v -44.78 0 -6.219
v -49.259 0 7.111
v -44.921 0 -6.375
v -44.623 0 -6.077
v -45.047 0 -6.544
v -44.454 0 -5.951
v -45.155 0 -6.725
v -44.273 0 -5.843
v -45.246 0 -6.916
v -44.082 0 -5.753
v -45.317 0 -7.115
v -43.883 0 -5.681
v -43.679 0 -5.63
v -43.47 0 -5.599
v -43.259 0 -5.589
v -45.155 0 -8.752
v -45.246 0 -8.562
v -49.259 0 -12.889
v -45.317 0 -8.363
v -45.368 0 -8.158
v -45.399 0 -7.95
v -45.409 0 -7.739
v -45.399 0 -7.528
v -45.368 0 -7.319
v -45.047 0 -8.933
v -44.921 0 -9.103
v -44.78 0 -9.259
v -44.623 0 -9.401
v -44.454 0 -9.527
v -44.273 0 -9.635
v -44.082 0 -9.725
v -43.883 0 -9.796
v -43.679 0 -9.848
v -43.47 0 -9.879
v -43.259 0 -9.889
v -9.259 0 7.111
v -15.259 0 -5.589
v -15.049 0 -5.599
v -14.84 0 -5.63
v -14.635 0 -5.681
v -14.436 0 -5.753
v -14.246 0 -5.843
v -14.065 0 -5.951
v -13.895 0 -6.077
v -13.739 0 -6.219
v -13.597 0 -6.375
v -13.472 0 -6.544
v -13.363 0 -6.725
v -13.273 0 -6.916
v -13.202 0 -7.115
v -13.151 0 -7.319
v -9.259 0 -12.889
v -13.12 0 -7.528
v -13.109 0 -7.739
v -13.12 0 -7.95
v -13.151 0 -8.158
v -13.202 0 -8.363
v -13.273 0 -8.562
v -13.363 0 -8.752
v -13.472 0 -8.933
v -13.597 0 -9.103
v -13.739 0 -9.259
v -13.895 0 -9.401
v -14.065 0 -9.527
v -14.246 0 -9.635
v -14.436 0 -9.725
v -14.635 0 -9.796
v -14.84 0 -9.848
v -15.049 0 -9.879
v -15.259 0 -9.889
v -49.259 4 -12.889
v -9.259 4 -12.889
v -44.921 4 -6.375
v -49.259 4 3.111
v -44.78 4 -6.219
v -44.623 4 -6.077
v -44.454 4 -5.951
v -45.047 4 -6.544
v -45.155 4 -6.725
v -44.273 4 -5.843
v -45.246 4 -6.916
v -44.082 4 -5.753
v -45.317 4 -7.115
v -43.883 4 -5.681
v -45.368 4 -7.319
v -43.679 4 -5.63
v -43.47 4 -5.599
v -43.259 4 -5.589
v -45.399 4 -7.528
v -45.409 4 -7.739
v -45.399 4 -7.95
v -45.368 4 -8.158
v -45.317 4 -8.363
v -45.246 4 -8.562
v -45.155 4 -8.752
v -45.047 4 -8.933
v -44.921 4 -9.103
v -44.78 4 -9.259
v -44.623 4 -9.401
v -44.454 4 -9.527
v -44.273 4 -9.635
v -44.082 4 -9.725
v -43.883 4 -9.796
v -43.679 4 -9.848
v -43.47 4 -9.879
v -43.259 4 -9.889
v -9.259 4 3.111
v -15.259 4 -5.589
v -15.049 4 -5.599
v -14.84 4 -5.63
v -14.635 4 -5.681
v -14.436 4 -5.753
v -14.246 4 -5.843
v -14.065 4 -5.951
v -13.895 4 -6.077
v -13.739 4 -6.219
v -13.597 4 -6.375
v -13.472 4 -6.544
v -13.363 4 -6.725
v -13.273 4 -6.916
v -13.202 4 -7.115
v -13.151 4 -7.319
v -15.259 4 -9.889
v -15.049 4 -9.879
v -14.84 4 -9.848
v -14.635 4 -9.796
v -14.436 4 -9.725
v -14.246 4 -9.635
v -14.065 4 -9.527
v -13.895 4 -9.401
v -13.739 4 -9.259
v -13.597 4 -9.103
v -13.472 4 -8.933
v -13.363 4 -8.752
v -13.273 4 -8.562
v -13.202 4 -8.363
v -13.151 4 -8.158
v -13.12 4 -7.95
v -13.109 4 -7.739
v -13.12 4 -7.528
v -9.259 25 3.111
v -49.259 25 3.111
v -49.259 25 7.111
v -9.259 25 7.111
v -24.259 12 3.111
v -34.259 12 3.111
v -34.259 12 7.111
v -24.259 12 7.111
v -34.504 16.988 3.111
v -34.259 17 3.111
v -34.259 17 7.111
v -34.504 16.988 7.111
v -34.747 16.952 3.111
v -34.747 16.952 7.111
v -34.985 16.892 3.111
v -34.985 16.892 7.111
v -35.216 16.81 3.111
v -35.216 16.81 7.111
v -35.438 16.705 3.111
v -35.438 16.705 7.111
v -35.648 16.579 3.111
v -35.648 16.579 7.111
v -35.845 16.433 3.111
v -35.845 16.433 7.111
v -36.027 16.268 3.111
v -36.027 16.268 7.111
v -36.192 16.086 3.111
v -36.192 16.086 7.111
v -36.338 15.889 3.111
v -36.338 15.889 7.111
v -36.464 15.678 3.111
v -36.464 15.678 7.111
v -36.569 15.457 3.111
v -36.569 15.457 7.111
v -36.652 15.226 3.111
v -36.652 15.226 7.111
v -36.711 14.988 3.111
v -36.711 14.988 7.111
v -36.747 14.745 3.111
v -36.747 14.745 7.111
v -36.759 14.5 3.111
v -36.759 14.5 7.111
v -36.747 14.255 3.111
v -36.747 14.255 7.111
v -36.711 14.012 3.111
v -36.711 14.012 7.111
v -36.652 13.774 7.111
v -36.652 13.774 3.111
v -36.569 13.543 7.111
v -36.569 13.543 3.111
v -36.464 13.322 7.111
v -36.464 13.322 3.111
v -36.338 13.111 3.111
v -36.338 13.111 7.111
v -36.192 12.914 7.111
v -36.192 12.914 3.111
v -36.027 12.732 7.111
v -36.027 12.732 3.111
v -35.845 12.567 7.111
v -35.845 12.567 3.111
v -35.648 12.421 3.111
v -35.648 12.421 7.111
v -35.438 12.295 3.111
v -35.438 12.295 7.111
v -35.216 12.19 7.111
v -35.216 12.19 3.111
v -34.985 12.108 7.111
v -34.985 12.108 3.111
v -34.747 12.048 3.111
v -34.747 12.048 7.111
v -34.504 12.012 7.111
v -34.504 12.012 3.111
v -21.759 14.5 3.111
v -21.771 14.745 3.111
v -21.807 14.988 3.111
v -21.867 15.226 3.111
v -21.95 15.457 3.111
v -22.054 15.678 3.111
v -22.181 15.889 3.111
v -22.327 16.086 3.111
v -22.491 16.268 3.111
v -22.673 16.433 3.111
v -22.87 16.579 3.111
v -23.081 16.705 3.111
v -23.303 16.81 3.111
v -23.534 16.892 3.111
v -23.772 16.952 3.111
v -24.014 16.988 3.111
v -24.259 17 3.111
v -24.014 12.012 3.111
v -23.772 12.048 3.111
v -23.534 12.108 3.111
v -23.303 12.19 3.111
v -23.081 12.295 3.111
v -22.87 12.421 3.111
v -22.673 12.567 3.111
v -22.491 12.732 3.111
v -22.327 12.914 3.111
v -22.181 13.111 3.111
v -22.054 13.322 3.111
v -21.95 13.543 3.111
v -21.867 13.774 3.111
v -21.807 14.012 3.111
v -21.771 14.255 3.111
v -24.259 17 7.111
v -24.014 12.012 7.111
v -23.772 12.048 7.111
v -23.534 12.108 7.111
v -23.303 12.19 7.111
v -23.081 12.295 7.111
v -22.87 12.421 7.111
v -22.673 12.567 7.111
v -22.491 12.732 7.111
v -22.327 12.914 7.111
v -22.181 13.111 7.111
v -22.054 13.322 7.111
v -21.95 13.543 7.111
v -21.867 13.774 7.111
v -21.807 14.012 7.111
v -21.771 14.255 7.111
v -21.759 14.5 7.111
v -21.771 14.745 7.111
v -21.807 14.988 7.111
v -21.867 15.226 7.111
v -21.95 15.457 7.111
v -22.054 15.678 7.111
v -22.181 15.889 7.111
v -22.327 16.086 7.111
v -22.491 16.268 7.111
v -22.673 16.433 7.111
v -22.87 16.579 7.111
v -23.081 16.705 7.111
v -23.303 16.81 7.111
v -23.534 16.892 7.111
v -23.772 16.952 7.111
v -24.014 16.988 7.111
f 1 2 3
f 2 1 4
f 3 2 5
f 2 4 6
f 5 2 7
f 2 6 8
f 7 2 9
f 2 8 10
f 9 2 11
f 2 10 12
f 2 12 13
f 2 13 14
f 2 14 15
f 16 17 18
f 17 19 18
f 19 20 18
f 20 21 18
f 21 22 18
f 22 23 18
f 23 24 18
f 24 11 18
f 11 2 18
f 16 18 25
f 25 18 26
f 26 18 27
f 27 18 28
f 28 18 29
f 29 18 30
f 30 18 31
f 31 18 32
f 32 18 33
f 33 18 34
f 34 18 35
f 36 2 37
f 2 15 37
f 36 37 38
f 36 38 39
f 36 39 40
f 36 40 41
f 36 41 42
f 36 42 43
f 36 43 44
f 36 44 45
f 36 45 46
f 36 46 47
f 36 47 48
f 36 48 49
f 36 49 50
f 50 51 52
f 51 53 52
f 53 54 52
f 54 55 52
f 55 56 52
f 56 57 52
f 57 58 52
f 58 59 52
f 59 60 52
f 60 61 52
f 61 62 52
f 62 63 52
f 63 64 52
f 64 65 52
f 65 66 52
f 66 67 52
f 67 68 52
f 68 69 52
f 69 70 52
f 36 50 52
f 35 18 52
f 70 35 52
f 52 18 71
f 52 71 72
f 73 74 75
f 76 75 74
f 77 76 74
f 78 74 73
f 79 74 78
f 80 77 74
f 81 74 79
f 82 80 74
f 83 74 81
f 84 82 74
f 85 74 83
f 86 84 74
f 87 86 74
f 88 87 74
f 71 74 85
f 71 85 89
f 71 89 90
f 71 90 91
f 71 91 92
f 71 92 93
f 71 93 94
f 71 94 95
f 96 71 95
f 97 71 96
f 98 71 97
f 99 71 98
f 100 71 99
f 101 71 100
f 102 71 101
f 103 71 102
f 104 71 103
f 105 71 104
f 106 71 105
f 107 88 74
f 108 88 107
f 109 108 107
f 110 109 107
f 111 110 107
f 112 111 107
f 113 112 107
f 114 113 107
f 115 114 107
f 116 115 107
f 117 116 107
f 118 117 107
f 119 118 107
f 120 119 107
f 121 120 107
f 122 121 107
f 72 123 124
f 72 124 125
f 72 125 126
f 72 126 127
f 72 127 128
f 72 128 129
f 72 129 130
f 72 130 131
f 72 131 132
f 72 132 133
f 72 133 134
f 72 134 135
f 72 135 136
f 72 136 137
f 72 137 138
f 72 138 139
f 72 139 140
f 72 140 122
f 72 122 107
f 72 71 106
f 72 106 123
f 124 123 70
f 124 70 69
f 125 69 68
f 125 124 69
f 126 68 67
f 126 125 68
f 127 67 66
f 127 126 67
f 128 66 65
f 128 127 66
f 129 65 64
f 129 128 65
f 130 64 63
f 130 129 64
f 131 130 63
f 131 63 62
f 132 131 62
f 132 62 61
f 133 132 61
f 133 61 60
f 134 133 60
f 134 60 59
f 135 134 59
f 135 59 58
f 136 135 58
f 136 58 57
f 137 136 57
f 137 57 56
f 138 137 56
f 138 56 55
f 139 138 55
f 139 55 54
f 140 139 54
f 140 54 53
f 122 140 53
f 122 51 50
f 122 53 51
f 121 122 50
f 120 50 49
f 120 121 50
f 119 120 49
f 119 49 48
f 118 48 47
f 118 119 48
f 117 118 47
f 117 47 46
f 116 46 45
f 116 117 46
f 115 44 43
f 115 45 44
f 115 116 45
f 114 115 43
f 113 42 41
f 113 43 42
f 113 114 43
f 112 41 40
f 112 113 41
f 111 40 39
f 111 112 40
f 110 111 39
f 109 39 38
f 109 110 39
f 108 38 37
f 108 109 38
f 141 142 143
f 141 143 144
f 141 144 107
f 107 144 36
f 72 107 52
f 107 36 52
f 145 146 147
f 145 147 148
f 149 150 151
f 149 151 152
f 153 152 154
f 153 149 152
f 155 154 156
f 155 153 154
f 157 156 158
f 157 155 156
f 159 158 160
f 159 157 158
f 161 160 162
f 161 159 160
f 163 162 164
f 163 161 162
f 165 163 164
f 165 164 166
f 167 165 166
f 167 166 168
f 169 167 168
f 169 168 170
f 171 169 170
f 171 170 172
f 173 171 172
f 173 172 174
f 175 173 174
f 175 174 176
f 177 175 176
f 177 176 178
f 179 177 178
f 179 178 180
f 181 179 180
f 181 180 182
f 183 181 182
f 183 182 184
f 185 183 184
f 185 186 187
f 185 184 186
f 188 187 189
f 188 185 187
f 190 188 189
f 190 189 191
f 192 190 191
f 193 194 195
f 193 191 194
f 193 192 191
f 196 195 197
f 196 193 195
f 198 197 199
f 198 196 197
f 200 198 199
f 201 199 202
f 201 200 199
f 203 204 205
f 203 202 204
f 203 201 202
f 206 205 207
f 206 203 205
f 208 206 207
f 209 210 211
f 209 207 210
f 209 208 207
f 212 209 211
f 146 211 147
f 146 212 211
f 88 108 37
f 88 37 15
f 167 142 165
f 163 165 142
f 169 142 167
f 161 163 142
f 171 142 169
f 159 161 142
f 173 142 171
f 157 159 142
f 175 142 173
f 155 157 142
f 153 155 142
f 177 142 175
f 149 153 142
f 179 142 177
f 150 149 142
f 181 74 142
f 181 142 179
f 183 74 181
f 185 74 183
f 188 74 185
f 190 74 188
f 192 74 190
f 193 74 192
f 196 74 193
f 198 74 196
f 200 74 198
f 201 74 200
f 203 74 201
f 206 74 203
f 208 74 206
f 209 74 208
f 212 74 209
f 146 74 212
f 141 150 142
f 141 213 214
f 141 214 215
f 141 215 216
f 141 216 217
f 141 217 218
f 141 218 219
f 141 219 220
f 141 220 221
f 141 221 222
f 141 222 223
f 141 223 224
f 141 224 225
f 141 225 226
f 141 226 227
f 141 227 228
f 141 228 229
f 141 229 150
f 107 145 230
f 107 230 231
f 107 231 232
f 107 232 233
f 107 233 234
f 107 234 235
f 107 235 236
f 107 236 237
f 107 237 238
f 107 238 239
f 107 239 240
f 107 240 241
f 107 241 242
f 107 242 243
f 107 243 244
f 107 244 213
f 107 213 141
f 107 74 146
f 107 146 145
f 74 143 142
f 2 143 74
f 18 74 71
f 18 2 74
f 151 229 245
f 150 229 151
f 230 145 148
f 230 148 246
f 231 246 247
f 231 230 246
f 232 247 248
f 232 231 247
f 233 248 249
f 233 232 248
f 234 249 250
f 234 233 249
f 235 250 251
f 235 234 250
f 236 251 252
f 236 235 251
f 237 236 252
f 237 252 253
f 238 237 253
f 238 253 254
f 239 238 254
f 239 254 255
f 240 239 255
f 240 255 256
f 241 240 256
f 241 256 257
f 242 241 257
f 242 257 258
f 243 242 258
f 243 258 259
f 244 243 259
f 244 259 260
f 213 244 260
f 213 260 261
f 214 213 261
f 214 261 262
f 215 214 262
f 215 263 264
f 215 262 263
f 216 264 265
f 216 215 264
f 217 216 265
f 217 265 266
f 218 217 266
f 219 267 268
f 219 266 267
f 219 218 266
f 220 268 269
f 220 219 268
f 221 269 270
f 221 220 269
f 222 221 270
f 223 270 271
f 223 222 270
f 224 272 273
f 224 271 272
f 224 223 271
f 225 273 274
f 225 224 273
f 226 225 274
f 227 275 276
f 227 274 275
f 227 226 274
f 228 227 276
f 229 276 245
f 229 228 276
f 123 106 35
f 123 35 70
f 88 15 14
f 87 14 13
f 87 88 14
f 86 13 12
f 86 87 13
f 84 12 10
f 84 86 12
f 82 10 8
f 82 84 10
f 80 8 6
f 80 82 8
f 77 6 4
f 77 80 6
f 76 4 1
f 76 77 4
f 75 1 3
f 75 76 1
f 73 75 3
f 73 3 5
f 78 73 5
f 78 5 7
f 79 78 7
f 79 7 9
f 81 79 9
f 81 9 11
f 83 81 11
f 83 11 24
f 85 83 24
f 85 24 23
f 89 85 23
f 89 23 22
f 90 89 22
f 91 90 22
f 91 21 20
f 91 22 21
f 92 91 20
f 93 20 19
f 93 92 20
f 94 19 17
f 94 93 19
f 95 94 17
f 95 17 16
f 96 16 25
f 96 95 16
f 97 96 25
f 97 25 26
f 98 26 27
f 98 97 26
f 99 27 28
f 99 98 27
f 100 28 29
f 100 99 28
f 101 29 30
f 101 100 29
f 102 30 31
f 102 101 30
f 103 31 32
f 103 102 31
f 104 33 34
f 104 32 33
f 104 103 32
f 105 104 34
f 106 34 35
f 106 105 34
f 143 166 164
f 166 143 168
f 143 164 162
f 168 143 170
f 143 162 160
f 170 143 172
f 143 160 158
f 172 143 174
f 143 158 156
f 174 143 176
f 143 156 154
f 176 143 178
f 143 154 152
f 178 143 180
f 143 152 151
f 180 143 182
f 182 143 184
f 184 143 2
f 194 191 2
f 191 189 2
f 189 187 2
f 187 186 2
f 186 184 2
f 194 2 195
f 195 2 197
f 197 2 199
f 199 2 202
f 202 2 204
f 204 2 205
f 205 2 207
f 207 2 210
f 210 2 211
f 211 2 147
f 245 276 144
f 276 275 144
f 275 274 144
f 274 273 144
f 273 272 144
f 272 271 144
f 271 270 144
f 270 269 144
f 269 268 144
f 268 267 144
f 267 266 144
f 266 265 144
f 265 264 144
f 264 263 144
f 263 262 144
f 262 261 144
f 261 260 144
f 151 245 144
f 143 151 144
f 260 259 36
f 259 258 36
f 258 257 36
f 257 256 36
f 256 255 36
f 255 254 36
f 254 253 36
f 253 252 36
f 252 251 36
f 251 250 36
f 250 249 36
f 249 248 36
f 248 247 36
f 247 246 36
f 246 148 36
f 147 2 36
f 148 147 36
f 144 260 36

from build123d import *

# Parameters (mm, degrees)
SKETCH1_W           = 40
SKETCH1_H           = 20
BOSS_EXTRUDE1_DEPTH = 4
SKETCH5_W           = 40
SKETCH5_H           = 4
BOSS_EXTRUDE2_DEPTH = 21
CUT_EXTRUDE3_DEPTH  = 10
CUT_EXTRUDE5_DEPTH  = 10


with BuildPart() as part:
    # Sketch1 → Boss-Extrude1 (new body)
    with BuildSketch(Plane(origin=(0, 0, 0), x_dir=(1, 0, 0), z_dir=(0, 1, 0))):
        with Locations((-29.259259259, 2.888888889)):
            Rectangle(SKETCH1_W, SKETCH1_H)
    extrude(amount=BOSS_EXTRUDE1_DEPTH)

    # Sketch5 → Boss-Extrude2 (add)
    with BuildSketch(Plane(origin=(0, 4, 0), x_dir=(1, 0, 0), z_dir=(0, 1, 0))):
        with Locations((-29.259259259, -5.111111111)):
            Rectangle(SKETCH5_W, SKETCH5_H)
    extrude(amount=BOSS_EXTRUDE2_DEPTH)

    # Sketch7 → Cut-Extrude3 (cut)
    with BuildSketch(Plane(origin=(0, 4, 0), x_dir=(1, 0, 0), z_dir=(0, 1, 0))):
        with BuildLine():
            Line((-15.259259259, 5.588888889), (-43.259259259, 5.588888889))
            ThreePointArc((-43.259259259, 5.588888889), (-45.409259259, 7.738888889), (-43.259259259, 9.888888889))
            Line((-43.259259259, 9.888888889), (-15.259259259, 9.888888889))
            ThreePointArc((-15.259259259, 9.888888889), (-13.109259259, 7.738888889), (-15.259259259, 5.588888889))
        make_face()
    extrude(amount=-CUT_EXTRUDE3_DEPTH, mode=Mode.SUBTRACT)

    # Sketch8 → Cut-Extrude5 (cut)
    with BuildSketch(Plane(origin=(0, 0, 3.111111111), x_dir=(-1, 0, 0), z_dir=(0, 0, -1))):
        with BuildLine():
            Line((24.259259259, 17), (34.259259259, 17))
            ThreePointArc((34.259259259, 17), (36.759259259, 14.5), (34.259259259, 12))
            Line((34.259259259, 12), (24.259259259, 12))
            ThreePointArc((24.259259259, 12), (21.759259259, 14.5), (24.259259259, 17))
        make_face()
    extrude(amount=-CUT_EXTRUDE5_DEPTH, mode=Mode.SUBTRACT)


solid = part.part
